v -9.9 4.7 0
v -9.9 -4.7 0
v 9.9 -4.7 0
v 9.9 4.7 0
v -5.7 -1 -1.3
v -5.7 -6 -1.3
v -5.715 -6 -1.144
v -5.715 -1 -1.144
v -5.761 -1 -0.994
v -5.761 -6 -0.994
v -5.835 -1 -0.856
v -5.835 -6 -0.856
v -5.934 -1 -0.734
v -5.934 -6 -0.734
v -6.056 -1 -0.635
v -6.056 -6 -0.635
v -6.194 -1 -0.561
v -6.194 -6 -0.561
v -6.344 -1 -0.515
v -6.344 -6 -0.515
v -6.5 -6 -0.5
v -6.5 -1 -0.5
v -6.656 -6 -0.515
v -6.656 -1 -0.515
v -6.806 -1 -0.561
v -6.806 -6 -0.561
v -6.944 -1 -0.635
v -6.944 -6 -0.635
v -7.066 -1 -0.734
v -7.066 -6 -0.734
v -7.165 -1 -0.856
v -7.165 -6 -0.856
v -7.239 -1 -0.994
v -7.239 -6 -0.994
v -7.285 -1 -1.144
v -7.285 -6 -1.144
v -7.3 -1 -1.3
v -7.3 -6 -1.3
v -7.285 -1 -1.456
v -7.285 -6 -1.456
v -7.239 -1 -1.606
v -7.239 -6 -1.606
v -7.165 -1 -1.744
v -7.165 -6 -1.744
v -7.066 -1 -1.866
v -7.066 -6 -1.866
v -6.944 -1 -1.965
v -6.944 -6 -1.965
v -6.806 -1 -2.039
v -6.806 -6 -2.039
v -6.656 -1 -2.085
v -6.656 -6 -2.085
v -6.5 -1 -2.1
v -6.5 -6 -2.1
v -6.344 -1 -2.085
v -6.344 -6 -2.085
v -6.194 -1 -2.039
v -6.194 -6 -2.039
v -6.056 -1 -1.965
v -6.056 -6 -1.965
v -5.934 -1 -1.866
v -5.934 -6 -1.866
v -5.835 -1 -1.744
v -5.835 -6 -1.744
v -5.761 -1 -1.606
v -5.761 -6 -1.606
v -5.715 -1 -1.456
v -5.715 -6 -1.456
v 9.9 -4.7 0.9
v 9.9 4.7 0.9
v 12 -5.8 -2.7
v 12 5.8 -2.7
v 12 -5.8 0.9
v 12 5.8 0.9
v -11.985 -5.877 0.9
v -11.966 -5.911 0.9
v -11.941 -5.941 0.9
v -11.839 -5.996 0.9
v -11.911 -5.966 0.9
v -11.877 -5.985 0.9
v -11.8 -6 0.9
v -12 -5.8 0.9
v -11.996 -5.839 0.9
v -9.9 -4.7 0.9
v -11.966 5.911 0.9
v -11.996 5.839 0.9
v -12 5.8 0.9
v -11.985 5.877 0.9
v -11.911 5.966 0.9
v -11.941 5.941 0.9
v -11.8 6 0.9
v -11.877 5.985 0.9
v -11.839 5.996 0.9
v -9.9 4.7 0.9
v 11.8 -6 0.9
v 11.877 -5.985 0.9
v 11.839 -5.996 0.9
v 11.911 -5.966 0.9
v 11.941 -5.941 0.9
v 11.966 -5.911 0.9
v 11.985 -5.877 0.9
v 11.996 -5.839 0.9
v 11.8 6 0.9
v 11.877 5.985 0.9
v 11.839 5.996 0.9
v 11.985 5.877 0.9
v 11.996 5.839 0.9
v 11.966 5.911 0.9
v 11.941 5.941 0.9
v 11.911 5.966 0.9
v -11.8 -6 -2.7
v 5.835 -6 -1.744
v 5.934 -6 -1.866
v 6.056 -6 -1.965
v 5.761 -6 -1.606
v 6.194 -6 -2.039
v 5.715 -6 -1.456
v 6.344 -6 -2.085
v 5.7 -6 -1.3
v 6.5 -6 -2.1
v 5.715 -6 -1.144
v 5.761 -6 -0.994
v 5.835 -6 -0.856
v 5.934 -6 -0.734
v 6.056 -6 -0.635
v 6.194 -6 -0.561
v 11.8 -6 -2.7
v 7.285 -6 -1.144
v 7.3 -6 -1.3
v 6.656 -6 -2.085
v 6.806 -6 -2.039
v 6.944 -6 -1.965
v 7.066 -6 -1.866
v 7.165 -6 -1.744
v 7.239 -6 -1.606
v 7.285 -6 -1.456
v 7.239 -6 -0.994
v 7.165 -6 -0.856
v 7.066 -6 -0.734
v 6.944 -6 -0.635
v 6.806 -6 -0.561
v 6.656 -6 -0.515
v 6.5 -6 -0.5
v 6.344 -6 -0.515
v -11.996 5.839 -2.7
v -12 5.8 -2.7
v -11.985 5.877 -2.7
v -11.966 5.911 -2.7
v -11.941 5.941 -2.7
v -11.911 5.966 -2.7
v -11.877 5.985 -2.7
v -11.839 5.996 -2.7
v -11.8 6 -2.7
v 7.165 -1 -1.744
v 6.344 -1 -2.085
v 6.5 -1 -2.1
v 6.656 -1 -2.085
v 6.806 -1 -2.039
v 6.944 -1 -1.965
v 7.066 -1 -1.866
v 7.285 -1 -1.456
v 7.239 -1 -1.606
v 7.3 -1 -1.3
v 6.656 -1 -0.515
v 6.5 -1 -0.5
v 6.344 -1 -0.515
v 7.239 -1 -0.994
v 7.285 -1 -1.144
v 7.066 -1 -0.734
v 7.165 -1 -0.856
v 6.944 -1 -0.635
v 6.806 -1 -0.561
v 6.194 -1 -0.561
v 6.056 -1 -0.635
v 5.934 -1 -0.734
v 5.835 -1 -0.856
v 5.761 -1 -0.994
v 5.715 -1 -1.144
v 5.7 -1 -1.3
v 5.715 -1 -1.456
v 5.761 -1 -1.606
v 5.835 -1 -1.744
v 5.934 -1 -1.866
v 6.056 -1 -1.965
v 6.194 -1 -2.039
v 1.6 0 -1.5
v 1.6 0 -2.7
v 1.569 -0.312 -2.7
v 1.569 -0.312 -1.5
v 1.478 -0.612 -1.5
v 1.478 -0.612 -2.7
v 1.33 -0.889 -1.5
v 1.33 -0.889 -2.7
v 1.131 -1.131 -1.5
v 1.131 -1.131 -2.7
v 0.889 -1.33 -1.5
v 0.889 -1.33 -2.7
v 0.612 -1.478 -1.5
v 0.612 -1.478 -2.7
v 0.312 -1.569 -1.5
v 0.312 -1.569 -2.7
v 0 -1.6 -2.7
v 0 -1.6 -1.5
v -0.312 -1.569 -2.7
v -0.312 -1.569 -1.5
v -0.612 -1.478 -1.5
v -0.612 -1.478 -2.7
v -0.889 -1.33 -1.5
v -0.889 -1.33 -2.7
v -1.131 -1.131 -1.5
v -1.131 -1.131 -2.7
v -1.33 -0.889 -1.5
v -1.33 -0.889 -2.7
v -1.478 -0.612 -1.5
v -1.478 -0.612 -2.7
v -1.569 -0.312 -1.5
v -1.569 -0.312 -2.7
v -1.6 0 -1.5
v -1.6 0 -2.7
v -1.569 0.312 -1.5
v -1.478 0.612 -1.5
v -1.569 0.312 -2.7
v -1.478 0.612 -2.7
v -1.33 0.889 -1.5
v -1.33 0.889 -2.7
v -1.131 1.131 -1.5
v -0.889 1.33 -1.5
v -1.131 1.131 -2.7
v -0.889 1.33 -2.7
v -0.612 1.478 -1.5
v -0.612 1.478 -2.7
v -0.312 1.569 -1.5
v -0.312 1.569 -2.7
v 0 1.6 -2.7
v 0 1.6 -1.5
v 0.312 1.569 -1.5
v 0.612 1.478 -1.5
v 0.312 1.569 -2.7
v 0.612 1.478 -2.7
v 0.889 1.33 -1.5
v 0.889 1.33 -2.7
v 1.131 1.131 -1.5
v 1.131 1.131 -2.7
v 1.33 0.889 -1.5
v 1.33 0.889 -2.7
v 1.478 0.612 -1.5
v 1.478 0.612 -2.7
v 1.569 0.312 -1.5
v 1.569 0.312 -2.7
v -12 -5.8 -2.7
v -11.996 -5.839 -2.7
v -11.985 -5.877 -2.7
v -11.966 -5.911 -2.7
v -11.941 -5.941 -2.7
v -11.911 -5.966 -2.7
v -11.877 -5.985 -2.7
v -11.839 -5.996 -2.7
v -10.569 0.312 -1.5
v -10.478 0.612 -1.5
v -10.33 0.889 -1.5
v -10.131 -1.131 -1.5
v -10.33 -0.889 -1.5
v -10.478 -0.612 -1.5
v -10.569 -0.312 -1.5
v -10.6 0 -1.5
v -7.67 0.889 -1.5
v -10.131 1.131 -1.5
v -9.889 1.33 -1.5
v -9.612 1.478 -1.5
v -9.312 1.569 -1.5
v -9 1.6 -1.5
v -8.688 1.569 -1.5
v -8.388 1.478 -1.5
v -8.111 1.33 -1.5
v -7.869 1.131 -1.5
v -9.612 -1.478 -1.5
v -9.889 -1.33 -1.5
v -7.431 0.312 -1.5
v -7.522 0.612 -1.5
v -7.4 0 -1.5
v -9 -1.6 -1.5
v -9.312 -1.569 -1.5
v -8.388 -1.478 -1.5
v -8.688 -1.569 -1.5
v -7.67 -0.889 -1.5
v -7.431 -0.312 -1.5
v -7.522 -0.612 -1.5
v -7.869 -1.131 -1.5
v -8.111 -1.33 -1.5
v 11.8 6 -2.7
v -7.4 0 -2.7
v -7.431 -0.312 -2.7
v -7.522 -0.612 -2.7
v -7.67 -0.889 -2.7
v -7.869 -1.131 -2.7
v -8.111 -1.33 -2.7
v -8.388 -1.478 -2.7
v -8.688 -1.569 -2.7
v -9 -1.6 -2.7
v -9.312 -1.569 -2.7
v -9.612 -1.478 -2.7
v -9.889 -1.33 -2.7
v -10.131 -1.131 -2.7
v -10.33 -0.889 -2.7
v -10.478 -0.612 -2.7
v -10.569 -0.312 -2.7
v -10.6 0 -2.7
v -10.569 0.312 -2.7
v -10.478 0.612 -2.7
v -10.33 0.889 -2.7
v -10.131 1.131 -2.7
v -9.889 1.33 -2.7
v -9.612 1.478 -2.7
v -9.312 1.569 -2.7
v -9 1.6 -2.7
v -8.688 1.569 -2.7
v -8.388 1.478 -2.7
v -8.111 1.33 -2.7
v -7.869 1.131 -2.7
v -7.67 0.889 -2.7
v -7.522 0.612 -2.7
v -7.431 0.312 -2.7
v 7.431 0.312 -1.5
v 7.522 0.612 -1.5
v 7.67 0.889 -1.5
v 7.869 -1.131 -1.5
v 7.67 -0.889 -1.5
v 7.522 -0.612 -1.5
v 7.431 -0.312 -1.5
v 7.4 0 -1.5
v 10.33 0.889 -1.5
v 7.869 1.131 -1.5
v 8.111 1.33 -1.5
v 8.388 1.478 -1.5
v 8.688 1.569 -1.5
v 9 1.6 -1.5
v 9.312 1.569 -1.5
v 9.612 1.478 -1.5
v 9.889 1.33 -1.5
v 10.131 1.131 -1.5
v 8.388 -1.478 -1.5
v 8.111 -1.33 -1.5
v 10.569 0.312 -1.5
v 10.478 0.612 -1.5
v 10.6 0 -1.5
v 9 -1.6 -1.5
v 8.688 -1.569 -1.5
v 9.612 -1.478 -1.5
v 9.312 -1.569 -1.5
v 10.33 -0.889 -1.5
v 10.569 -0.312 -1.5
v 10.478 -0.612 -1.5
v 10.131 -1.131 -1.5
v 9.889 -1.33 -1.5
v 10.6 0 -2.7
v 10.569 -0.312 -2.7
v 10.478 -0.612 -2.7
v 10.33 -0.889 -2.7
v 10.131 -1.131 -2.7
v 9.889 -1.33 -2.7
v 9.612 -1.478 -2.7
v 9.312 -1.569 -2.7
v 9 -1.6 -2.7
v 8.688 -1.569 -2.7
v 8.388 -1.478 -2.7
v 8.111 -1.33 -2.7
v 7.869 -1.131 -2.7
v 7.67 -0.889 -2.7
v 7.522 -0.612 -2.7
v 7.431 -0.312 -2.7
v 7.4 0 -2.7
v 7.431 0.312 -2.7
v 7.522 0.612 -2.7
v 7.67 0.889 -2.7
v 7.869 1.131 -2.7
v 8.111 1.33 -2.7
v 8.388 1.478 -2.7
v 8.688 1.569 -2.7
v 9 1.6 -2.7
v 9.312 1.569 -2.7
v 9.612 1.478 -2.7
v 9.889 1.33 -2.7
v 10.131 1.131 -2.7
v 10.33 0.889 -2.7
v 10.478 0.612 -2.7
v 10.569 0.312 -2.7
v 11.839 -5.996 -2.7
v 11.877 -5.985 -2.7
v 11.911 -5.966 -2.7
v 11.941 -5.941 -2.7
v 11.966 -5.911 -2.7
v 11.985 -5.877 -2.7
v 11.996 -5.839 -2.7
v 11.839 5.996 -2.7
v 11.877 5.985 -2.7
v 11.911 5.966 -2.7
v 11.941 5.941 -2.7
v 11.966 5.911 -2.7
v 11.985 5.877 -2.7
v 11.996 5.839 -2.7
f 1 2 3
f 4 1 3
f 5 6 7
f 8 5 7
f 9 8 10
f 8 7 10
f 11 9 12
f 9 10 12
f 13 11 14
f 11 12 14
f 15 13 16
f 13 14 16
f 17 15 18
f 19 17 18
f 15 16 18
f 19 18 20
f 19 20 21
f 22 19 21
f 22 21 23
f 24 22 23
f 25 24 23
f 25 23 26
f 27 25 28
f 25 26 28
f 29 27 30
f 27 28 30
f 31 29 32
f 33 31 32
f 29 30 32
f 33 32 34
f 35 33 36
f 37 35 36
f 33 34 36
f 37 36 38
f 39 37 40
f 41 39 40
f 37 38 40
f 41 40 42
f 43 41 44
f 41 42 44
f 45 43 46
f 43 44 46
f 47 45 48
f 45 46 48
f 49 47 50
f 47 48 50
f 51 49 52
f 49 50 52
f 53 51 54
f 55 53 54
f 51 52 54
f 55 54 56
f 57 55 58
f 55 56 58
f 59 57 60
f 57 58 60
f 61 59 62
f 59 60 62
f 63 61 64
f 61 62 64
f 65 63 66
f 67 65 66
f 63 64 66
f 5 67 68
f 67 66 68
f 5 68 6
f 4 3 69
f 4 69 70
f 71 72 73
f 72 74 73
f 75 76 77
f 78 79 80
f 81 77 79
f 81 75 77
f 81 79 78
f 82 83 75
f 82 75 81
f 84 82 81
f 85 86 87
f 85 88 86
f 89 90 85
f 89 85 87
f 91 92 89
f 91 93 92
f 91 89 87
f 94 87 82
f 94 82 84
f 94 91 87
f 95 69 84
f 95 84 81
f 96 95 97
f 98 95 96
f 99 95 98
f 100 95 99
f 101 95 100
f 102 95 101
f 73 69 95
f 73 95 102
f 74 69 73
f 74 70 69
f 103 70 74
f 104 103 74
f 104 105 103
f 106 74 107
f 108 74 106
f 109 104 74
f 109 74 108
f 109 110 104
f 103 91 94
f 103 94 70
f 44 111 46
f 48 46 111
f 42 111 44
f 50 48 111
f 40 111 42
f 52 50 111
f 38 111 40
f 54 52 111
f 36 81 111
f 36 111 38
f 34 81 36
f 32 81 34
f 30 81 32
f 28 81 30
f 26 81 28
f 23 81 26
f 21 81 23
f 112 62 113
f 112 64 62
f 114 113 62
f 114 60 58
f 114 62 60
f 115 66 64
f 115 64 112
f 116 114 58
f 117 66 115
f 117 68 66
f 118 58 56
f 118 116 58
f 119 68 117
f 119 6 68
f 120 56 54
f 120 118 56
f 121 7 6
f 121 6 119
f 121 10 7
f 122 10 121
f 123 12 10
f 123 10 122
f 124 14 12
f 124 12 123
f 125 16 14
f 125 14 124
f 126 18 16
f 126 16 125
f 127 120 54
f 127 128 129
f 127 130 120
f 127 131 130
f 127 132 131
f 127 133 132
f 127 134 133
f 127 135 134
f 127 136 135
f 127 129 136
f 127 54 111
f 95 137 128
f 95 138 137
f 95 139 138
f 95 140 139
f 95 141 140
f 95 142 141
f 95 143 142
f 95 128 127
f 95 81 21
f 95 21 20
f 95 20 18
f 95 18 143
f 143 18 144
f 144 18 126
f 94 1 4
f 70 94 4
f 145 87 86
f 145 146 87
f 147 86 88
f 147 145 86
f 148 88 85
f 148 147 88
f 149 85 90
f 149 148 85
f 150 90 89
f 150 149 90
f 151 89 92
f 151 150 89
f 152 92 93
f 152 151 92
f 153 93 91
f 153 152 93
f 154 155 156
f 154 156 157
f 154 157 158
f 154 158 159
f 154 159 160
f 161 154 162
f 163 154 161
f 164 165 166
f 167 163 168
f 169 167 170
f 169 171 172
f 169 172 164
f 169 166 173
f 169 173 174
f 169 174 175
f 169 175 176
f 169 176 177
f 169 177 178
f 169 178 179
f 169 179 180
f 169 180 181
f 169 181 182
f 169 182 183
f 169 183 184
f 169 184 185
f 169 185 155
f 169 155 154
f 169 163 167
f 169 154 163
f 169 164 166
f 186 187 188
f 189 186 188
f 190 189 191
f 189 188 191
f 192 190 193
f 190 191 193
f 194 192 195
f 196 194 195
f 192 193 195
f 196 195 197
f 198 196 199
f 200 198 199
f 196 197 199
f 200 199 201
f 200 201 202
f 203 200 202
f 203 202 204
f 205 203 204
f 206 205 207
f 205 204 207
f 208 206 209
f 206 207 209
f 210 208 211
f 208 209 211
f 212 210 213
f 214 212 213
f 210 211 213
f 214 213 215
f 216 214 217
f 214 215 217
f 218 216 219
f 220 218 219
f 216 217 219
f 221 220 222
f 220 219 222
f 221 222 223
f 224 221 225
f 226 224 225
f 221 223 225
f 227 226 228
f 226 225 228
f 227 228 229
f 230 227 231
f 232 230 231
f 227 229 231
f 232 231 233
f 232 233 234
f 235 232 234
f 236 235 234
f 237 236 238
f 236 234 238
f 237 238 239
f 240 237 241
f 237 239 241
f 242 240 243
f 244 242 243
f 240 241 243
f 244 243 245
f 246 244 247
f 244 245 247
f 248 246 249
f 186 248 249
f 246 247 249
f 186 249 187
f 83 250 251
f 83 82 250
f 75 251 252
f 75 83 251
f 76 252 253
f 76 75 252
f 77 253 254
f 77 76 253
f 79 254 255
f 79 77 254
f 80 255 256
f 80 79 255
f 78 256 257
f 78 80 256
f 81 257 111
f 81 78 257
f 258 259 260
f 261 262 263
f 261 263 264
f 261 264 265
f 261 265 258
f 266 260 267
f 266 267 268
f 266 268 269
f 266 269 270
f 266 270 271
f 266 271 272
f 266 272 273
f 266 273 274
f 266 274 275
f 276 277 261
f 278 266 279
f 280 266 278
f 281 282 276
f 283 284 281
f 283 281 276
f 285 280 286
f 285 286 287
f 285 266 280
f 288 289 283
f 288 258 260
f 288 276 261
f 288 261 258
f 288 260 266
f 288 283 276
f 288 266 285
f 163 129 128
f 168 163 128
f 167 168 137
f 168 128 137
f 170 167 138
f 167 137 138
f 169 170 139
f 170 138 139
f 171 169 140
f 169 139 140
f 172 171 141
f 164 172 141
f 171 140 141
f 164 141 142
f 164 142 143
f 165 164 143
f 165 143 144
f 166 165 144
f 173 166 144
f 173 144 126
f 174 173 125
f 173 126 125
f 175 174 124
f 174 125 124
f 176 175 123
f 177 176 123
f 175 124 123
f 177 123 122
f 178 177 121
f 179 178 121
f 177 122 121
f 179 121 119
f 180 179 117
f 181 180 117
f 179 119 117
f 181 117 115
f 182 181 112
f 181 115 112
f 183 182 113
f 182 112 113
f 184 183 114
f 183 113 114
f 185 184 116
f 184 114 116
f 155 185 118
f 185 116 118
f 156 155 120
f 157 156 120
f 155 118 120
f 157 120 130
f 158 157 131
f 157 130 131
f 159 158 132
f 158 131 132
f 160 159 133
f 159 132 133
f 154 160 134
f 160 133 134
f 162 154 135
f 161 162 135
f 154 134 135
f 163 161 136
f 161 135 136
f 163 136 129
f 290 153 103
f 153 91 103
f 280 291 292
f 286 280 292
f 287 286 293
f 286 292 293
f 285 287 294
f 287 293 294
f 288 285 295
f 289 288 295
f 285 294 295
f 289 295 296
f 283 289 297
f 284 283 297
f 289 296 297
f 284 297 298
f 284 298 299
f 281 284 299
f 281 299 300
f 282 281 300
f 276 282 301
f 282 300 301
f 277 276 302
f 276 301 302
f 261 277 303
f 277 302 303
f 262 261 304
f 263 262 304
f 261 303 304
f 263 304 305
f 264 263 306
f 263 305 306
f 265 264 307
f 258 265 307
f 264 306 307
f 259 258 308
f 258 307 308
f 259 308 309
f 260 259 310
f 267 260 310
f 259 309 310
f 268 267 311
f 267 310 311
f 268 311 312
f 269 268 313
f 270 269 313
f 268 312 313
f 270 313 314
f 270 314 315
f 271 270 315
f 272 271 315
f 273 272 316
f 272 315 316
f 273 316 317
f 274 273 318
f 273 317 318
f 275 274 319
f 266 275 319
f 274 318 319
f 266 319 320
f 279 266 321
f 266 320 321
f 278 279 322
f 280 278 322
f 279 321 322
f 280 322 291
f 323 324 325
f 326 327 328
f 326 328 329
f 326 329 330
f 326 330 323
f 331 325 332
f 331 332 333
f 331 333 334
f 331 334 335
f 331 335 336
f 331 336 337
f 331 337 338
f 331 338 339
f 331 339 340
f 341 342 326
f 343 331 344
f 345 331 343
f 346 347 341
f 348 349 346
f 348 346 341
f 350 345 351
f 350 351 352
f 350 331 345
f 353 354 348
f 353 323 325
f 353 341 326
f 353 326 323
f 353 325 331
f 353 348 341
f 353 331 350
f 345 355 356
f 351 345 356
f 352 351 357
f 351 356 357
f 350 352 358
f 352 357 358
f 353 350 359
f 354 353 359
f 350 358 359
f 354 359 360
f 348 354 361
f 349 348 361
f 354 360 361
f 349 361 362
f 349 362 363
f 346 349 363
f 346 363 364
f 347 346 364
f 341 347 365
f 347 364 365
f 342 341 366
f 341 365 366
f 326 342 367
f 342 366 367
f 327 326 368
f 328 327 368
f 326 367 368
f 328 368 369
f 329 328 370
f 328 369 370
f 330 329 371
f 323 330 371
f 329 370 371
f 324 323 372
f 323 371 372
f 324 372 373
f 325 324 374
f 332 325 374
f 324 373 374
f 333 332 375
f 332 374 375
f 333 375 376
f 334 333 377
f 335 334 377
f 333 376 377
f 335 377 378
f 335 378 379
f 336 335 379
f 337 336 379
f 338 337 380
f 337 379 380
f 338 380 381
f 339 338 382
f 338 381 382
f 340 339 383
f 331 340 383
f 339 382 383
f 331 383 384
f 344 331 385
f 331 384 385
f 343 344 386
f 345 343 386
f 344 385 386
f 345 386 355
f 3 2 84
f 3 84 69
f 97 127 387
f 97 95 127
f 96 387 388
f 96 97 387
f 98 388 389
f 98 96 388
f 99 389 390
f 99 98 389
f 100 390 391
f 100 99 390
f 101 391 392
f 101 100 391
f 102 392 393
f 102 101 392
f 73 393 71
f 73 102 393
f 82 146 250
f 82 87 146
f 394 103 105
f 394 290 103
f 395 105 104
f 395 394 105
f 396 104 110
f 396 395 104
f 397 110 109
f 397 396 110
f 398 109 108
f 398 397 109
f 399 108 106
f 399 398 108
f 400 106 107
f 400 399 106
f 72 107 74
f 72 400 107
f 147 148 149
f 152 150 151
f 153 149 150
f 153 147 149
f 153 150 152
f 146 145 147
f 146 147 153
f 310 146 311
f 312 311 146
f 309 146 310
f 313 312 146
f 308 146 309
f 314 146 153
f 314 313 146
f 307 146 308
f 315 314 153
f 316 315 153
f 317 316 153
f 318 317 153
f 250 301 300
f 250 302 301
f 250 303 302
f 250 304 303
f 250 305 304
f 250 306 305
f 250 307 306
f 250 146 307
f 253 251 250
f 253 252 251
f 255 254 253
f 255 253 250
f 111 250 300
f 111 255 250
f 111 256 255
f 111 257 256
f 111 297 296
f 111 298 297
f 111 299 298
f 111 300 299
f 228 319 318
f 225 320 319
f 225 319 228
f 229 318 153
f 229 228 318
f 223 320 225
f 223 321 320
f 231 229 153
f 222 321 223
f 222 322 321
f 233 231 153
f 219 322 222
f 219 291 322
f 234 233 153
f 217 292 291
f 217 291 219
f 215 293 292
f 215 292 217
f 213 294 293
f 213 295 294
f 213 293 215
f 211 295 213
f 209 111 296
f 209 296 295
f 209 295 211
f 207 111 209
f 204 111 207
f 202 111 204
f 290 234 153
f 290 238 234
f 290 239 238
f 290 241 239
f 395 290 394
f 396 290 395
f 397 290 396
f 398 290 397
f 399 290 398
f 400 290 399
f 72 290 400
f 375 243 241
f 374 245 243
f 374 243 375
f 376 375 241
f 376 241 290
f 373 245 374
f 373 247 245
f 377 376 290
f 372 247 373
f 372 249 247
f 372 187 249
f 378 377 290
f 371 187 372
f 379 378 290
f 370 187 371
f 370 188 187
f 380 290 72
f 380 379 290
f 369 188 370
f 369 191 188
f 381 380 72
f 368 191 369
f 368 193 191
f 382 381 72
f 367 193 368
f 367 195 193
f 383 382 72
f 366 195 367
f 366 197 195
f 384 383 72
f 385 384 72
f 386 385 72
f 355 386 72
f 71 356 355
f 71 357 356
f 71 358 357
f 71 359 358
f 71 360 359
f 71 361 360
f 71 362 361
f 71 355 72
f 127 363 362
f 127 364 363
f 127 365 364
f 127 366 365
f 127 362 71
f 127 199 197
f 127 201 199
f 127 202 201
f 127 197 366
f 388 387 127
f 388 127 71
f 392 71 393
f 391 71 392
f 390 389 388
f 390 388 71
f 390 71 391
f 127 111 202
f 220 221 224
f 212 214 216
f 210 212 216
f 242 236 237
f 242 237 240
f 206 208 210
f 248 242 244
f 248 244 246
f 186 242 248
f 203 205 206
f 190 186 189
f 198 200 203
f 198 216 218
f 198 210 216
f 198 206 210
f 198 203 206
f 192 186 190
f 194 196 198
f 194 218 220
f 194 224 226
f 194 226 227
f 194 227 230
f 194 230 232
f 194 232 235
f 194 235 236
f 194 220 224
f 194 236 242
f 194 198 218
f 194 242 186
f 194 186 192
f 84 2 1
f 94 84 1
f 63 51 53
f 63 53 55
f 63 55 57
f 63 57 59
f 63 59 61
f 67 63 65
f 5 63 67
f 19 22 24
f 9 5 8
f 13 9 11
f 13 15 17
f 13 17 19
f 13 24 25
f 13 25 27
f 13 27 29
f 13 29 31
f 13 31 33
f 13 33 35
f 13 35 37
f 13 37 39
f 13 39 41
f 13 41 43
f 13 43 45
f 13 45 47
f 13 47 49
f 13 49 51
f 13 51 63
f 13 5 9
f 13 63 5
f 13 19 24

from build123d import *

# Parameters (mm, degrees)
F0_W     = 24
F0_H     = 12
F0_W_2   = 19.8
F0_H_2   = 9.4
F1_DEPTH = 0.9
F2_W     = 24
F2_H     = 12
F3_DEPTH = 2.7
F4_R     = 1.6
F5_DEPTH = 1.2
F6_R     = 0.2
F7_R     = 0.8
F8_DEPTH = 5


with BuildPart() as f1:
    # F0 (on Top) → F1 (new body)
    with BuildSketch(Plane.XY):
        Rectangle(F0_W, F0_H)
        Rectangle(F0_W_2, F0_H_2, mode=Mode.SUBTRACT)
    extrude(amount=F1_DEPTH)

    # F2 (on face) → F3 (join)
    with BuildSketch(Plane(origin=(0, 0, 0), x_dir=(1, 0, 0), z_dir=(0, 0, -1))):
        Rectangle(F2_W, F2_H)
    extrude(amount=F3_DEPTH)

    # F4 (on face) → F5 (cut)
    with BuildSketch(Plane(origin=(0, 0, -2.7), x_dir=(1, 0, 0), z_dir=(0, 0, -1))):
        Circle(F4_R)
        with Locations((-9, 0)):
            Circle(F4_R)
        with Locations((9, 0)):
            Circle(F4_R)
    extrude(amount=-F5_DEPTH, mode=Mode.SUBTRACT)

    # F6
    f6_edges = [f1.edges().sort_by_distance(p)[0] for p in [
        (-12, -6, -0.9),
        (-12, 6, -0.9),
        (12, 6, -0.9),
        (12, -6, -0.9),
    ]]
    fillet(f6_edges, radius=F6_R)

    # F7 (on face) → F8 (cut)
    with BuildSketch(Plane.XZ.offset(6)):
        with Locations((-6.5, -1.3)):
            Circle(F7_R)
        with Locations((6.5, -1.3)):
            Circle(F7_R)
    extrude(amount=-F8_DEPTH, mode=Mode.SUBTRACT)


solid = f1.part
